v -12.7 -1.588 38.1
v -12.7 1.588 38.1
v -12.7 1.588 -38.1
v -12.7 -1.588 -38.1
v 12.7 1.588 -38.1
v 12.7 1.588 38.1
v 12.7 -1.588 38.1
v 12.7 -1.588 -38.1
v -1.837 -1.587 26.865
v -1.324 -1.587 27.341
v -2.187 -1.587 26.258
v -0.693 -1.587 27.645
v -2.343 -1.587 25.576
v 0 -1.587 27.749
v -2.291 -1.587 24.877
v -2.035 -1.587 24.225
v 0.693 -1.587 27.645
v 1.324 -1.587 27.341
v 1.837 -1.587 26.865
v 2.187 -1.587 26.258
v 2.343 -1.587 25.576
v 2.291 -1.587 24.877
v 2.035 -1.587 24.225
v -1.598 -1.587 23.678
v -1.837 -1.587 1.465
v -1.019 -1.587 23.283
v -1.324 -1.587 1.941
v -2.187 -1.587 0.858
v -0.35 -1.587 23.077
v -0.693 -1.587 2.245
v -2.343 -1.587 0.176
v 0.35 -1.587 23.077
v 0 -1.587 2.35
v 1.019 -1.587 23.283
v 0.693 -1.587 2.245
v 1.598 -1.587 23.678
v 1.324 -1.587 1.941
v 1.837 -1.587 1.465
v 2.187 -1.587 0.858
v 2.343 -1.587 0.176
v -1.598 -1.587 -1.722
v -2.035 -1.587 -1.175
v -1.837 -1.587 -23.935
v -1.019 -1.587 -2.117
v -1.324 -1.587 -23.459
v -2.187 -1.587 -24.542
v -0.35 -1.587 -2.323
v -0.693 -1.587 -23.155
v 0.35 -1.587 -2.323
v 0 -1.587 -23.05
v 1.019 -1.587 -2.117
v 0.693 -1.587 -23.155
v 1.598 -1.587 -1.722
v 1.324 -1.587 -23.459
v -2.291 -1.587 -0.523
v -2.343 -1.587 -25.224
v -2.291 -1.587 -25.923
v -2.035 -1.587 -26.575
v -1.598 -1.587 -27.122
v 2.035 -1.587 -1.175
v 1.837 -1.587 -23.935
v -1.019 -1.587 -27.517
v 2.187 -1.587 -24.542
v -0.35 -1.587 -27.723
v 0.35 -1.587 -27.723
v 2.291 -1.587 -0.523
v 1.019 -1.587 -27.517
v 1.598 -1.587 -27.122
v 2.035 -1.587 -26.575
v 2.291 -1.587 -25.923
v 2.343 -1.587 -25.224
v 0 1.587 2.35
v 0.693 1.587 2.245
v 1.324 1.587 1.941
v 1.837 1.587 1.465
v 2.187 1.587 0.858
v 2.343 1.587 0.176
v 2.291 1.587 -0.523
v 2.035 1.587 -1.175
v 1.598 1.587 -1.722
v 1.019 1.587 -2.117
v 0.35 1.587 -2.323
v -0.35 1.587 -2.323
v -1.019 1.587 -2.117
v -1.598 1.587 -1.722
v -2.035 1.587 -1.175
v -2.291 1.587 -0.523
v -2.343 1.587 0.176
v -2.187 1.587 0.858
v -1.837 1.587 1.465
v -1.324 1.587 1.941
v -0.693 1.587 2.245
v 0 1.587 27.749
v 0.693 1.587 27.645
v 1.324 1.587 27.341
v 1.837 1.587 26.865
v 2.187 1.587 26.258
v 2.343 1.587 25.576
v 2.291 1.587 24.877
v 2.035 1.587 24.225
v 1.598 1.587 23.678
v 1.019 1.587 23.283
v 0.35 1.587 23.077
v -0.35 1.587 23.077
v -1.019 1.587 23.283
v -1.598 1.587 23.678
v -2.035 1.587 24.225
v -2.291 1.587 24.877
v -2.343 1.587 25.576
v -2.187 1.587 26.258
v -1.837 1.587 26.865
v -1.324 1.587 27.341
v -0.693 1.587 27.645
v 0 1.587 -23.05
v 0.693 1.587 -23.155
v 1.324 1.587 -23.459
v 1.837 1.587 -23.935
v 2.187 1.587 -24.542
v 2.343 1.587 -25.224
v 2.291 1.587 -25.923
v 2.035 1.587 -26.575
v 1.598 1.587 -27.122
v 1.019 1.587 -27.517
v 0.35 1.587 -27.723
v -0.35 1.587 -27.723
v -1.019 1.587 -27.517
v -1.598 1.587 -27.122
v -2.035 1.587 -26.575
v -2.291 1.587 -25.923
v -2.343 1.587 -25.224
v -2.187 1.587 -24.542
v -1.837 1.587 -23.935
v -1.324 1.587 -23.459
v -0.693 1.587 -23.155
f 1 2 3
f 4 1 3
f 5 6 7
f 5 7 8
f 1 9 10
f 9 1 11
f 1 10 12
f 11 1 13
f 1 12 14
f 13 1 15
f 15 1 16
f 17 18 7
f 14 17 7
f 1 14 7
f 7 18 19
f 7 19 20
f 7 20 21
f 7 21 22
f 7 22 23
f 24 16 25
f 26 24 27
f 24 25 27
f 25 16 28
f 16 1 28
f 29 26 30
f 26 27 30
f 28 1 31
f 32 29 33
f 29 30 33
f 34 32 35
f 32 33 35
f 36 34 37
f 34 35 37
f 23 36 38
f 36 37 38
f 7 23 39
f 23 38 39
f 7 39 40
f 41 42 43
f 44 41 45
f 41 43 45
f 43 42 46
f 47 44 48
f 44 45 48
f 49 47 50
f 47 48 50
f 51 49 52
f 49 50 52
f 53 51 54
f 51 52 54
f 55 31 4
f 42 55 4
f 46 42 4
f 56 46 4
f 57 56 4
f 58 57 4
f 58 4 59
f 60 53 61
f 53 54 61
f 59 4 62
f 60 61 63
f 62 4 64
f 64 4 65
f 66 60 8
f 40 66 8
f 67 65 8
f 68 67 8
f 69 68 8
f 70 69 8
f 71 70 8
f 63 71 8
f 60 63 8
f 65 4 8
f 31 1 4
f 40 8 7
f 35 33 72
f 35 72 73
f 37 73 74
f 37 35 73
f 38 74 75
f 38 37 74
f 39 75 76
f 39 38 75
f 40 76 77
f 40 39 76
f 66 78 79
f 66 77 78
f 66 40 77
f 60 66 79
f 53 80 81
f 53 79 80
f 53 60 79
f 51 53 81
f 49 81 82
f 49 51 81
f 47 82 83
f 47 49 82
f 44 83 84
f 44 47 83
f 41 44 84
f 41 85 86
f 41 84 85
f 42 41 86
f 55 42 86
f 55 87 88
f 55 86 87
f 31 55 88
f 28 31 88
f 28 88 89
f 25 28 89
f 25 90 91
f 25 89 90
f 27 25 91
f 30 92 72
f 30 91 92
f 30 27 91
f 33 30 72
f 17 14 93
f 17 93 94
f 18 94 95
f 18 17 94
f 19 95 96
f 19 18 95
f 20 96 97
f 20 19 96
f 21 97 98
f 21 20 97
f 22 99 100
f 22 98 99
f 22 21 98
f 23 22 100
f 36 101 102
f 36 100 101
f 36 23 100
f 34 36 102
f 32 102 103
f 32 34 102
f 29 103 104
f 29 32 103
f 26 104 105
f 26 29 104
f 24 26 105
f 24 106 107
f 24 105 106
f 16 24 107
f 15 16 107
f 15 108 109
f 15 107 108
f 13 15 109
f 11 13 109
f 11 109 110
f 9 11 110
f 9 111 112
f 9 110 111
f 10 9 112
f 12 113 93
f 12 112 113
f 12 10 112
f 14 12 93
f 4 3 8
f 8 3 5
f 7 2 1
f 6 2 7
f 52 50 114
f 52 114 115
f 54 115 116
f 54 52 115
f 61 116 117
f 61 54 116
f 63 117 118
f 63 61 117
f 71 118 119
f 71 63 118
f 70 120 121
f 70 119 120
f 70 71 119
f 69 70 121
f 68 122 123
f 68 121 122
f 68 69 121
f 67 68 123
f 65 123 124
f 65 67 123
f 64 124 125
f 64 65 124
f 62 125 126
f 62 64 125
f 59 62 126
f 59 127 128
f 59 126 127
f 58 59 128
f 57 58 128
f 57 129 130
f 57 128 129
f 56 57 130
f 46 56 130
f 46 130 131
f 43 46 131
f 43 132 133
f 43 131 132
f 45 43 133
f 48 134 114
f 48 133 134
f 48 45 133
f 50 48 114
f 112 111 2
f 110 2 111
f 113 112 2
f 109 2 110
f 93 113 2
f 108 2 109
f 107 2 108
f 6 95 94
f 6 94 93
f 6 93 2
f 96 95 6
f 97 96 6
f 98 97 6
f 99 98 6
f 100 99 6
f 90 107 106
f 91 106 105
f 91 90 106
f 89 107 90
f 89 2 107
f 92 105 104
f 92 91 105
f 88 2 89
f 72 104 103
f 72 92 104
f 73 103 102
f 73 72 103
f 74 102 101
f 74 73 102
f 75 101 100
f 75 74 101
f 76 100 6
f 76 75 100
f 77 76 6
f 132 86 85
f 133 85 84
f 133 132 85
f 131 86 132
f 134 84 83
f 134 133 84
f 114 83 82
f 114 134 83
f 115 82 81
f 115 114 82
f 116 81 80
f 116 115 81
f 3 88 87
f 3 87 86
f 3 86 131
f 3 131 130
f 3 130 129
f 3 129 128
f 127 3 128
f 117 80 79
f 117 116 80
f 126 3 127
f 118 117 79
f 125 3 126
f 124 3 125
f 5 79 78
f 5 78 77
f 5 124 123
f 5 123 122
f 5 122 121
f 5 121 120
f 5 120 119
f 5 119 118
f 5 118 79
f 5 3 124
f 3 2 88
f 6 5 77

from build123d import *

# Parameters (mm, degrees)
SKETCH1_W               = 25.4
SKETCH1_H               = 76.2
BOSS_EXTRUDE1_DEPTH     = 1.5875
CUT_EXTRUDE1_DEPTH      = 41.286233691
CUT_EXTRUDE1_DEPTH_BACK = 41.286233691
SKETCH2_R               = 2.3495


with BuildPart() as part:
    # Sketch1 → Boss-Extrude1 (new, symmetric)
    with BuildSketch(Plane(origin=(0, 0, 0), x_dir=(1, 0, 0), z_dir=(0, 1, 0))):
        Rectangle(SKETCH1_W, SKETCH1_H)
    extrude(amount=BOSS_EXTRUDE1_DEPTH, both=True)

    # Sketch2 → Cut-Extrude1 (cut, two sides: drawn at the far end of the back side and taken through both)
    with BuildSketch(Plane(origin=(0, 1.5875, 0), x_dir=(1, 0, 0), z_dir=(0, 1, 0)).offset(-CUT_EXTRUDE1_DEPTH_BACK)):
        with Locations(Location((0, -25.4, 0), (0, 0, 270))):
            Circle(SKETCH2_R)
        with Locations(Location((0, 0, 0), (0, 0, 270))):
            Circle(SKETCH2_R)
        with Locations(Location((0, 25.4, 0), (0, 0, 270))):
            Circle(SKETCH2_R)
    extrude(amount=CUT_EXTRUDE1_DEPTH + CUT_EXTRUDE1_DEPTH_BACK, mode=Mode.SUBTRACT)


solid = part.part
